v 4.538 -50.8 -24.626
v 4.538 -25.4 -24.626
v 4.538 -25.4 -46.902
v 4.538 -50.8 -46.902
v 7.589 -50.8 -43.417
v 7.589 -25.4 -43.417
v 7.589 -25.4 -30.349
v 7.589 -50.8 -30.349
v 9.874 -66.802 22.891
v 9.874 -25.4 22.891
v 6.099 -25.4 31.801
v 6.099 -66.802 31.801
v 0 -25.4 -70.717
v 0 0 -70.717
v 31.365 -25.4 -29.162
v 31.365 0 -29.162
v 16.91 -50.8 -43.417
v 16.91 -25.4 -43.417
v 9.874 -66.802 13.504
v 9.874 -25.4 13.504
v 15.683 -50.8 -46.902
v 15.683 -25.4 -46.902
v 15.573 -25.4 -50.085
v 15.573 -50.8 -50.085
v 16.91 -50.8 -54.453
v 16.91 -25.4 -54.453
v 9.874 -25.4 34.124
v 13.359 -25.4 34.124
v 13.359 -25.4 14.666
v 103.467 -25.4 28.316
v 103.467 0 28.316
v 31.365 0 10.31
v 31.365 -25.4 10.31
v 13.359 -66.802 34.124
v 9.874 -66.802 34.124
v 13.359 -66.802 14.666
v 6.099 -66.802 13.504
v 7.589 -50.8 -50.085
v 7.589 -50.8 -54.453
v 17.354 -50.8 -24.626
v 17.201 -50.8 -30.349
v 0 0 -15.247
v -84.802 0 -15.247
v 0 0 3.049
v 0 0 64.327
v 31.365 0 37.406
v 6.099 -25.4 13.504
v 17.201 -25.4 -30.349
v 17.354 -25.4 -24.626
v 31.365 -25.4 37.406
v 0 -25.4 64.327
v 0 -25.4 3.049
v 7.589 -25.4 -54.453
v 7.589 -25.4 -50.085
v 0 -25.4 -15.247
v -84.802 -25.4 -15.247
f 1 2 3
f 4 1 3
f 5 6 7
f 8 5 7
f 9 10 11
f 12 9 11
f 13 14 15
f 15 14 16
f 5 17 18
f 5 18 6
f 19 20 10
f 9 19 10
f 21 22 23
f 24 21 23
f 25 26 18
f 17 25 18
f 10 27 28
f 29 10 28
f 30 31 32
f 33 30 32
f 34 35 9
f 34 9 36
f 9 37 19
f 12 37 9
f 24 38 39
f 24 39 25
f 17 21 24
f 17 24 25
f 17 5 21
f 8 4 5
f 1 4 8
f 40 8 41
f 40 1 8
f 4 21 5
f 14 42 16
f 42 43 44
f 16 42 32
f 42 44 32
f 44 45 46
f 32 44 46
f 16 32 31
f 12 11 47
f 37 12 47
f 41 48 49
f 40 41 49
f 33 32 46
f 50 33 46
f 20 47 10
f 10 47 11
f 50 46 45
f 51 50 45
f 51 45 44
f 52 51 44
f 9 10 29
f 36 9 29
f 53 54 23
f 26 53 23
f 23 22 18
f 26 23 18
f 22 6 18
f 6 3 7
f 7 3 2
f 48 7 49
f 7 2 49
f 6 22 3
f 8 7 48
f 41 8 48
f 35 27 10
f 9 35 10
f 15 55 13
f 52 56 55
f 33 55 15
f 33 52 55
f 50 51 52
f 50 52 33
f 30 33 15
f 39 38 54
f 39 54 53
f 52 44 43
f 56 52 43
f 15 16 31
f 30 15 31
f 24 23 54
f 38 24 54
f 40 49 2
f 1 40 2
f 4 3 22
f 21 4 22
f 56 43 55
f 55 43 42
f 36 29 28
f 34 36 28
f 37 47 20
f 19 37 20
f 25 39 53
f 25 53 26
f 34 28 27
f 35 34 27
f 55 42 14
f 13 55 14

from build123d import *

# Parameters (mm, degrees)
F1_DEPTH = 25.4
F3_DEPTH = 41.402
F5_DEPTH = 25.4


with BuildPart() as f1:
    # F0 (on Front) → F1 (new body)
    with BuildSketch(Plane.XZ):
        Polygon((31.365082, 37.405583), (0, 64.327464), (0, 3.049383), (-84.801883, -15.246916), (0, -15.246916), (0, -70.716642), (31.365082, -29.162369), (103.466924, 28.315699), (31.365082, 10.309819), align=None)
    extrude(amount=F1_DEPTH)


with BuildPart() as f3:
    # F2 (on face) → F3 (new body)
    with BuildSketch(Plane.XZ.offset(25.4)):
        Polygon((9.874192, 34.124047), (9.874192, 22.890702), (13.359201, 14.66608), (13.359201, 34.124047), align=None)
        Polygon((6.098765, 31.80071), (6.098765, 13.50441), (9.874192, 13.50441), (9.874192, 22.890702), align=None)
    extrude(amount=F3_DEPTH)


with BuildPart() as f5:
    # F4 (on face) → F5 (new body)
    with BuildSketch(Plane.XZ.offset(25.4)):
        Polygon((7.588764, -30.348621), (17.200813, -30.348621), (17.353797, -24.626331), (4.537863, -24.626331), (4.537863, -29.162369), (4.537863, -46.902414), (7.588764, -46.902414), (15.682541, -46.902414), (15.572592, -50.085172), (16.910398, -48.312769), (16.910398, -43.417405), (7.588764, -43.417405), (7.588764, -38.032392), align=None)
        Polygon((16.910398, -54.453265), (16.910398, -48.312769), (15.572592, -50.085172), (12.275564, -54.453265), align=None)
        Polygon((12.275564, -54.453265), (15.572592, -50.085172), (7.588764, -50.085172), (7.588764, -54.453265), align=None)
    extrude(amount=F5_DEPTH)


solid = Compound([f1.part, f3.part, f5.part])
